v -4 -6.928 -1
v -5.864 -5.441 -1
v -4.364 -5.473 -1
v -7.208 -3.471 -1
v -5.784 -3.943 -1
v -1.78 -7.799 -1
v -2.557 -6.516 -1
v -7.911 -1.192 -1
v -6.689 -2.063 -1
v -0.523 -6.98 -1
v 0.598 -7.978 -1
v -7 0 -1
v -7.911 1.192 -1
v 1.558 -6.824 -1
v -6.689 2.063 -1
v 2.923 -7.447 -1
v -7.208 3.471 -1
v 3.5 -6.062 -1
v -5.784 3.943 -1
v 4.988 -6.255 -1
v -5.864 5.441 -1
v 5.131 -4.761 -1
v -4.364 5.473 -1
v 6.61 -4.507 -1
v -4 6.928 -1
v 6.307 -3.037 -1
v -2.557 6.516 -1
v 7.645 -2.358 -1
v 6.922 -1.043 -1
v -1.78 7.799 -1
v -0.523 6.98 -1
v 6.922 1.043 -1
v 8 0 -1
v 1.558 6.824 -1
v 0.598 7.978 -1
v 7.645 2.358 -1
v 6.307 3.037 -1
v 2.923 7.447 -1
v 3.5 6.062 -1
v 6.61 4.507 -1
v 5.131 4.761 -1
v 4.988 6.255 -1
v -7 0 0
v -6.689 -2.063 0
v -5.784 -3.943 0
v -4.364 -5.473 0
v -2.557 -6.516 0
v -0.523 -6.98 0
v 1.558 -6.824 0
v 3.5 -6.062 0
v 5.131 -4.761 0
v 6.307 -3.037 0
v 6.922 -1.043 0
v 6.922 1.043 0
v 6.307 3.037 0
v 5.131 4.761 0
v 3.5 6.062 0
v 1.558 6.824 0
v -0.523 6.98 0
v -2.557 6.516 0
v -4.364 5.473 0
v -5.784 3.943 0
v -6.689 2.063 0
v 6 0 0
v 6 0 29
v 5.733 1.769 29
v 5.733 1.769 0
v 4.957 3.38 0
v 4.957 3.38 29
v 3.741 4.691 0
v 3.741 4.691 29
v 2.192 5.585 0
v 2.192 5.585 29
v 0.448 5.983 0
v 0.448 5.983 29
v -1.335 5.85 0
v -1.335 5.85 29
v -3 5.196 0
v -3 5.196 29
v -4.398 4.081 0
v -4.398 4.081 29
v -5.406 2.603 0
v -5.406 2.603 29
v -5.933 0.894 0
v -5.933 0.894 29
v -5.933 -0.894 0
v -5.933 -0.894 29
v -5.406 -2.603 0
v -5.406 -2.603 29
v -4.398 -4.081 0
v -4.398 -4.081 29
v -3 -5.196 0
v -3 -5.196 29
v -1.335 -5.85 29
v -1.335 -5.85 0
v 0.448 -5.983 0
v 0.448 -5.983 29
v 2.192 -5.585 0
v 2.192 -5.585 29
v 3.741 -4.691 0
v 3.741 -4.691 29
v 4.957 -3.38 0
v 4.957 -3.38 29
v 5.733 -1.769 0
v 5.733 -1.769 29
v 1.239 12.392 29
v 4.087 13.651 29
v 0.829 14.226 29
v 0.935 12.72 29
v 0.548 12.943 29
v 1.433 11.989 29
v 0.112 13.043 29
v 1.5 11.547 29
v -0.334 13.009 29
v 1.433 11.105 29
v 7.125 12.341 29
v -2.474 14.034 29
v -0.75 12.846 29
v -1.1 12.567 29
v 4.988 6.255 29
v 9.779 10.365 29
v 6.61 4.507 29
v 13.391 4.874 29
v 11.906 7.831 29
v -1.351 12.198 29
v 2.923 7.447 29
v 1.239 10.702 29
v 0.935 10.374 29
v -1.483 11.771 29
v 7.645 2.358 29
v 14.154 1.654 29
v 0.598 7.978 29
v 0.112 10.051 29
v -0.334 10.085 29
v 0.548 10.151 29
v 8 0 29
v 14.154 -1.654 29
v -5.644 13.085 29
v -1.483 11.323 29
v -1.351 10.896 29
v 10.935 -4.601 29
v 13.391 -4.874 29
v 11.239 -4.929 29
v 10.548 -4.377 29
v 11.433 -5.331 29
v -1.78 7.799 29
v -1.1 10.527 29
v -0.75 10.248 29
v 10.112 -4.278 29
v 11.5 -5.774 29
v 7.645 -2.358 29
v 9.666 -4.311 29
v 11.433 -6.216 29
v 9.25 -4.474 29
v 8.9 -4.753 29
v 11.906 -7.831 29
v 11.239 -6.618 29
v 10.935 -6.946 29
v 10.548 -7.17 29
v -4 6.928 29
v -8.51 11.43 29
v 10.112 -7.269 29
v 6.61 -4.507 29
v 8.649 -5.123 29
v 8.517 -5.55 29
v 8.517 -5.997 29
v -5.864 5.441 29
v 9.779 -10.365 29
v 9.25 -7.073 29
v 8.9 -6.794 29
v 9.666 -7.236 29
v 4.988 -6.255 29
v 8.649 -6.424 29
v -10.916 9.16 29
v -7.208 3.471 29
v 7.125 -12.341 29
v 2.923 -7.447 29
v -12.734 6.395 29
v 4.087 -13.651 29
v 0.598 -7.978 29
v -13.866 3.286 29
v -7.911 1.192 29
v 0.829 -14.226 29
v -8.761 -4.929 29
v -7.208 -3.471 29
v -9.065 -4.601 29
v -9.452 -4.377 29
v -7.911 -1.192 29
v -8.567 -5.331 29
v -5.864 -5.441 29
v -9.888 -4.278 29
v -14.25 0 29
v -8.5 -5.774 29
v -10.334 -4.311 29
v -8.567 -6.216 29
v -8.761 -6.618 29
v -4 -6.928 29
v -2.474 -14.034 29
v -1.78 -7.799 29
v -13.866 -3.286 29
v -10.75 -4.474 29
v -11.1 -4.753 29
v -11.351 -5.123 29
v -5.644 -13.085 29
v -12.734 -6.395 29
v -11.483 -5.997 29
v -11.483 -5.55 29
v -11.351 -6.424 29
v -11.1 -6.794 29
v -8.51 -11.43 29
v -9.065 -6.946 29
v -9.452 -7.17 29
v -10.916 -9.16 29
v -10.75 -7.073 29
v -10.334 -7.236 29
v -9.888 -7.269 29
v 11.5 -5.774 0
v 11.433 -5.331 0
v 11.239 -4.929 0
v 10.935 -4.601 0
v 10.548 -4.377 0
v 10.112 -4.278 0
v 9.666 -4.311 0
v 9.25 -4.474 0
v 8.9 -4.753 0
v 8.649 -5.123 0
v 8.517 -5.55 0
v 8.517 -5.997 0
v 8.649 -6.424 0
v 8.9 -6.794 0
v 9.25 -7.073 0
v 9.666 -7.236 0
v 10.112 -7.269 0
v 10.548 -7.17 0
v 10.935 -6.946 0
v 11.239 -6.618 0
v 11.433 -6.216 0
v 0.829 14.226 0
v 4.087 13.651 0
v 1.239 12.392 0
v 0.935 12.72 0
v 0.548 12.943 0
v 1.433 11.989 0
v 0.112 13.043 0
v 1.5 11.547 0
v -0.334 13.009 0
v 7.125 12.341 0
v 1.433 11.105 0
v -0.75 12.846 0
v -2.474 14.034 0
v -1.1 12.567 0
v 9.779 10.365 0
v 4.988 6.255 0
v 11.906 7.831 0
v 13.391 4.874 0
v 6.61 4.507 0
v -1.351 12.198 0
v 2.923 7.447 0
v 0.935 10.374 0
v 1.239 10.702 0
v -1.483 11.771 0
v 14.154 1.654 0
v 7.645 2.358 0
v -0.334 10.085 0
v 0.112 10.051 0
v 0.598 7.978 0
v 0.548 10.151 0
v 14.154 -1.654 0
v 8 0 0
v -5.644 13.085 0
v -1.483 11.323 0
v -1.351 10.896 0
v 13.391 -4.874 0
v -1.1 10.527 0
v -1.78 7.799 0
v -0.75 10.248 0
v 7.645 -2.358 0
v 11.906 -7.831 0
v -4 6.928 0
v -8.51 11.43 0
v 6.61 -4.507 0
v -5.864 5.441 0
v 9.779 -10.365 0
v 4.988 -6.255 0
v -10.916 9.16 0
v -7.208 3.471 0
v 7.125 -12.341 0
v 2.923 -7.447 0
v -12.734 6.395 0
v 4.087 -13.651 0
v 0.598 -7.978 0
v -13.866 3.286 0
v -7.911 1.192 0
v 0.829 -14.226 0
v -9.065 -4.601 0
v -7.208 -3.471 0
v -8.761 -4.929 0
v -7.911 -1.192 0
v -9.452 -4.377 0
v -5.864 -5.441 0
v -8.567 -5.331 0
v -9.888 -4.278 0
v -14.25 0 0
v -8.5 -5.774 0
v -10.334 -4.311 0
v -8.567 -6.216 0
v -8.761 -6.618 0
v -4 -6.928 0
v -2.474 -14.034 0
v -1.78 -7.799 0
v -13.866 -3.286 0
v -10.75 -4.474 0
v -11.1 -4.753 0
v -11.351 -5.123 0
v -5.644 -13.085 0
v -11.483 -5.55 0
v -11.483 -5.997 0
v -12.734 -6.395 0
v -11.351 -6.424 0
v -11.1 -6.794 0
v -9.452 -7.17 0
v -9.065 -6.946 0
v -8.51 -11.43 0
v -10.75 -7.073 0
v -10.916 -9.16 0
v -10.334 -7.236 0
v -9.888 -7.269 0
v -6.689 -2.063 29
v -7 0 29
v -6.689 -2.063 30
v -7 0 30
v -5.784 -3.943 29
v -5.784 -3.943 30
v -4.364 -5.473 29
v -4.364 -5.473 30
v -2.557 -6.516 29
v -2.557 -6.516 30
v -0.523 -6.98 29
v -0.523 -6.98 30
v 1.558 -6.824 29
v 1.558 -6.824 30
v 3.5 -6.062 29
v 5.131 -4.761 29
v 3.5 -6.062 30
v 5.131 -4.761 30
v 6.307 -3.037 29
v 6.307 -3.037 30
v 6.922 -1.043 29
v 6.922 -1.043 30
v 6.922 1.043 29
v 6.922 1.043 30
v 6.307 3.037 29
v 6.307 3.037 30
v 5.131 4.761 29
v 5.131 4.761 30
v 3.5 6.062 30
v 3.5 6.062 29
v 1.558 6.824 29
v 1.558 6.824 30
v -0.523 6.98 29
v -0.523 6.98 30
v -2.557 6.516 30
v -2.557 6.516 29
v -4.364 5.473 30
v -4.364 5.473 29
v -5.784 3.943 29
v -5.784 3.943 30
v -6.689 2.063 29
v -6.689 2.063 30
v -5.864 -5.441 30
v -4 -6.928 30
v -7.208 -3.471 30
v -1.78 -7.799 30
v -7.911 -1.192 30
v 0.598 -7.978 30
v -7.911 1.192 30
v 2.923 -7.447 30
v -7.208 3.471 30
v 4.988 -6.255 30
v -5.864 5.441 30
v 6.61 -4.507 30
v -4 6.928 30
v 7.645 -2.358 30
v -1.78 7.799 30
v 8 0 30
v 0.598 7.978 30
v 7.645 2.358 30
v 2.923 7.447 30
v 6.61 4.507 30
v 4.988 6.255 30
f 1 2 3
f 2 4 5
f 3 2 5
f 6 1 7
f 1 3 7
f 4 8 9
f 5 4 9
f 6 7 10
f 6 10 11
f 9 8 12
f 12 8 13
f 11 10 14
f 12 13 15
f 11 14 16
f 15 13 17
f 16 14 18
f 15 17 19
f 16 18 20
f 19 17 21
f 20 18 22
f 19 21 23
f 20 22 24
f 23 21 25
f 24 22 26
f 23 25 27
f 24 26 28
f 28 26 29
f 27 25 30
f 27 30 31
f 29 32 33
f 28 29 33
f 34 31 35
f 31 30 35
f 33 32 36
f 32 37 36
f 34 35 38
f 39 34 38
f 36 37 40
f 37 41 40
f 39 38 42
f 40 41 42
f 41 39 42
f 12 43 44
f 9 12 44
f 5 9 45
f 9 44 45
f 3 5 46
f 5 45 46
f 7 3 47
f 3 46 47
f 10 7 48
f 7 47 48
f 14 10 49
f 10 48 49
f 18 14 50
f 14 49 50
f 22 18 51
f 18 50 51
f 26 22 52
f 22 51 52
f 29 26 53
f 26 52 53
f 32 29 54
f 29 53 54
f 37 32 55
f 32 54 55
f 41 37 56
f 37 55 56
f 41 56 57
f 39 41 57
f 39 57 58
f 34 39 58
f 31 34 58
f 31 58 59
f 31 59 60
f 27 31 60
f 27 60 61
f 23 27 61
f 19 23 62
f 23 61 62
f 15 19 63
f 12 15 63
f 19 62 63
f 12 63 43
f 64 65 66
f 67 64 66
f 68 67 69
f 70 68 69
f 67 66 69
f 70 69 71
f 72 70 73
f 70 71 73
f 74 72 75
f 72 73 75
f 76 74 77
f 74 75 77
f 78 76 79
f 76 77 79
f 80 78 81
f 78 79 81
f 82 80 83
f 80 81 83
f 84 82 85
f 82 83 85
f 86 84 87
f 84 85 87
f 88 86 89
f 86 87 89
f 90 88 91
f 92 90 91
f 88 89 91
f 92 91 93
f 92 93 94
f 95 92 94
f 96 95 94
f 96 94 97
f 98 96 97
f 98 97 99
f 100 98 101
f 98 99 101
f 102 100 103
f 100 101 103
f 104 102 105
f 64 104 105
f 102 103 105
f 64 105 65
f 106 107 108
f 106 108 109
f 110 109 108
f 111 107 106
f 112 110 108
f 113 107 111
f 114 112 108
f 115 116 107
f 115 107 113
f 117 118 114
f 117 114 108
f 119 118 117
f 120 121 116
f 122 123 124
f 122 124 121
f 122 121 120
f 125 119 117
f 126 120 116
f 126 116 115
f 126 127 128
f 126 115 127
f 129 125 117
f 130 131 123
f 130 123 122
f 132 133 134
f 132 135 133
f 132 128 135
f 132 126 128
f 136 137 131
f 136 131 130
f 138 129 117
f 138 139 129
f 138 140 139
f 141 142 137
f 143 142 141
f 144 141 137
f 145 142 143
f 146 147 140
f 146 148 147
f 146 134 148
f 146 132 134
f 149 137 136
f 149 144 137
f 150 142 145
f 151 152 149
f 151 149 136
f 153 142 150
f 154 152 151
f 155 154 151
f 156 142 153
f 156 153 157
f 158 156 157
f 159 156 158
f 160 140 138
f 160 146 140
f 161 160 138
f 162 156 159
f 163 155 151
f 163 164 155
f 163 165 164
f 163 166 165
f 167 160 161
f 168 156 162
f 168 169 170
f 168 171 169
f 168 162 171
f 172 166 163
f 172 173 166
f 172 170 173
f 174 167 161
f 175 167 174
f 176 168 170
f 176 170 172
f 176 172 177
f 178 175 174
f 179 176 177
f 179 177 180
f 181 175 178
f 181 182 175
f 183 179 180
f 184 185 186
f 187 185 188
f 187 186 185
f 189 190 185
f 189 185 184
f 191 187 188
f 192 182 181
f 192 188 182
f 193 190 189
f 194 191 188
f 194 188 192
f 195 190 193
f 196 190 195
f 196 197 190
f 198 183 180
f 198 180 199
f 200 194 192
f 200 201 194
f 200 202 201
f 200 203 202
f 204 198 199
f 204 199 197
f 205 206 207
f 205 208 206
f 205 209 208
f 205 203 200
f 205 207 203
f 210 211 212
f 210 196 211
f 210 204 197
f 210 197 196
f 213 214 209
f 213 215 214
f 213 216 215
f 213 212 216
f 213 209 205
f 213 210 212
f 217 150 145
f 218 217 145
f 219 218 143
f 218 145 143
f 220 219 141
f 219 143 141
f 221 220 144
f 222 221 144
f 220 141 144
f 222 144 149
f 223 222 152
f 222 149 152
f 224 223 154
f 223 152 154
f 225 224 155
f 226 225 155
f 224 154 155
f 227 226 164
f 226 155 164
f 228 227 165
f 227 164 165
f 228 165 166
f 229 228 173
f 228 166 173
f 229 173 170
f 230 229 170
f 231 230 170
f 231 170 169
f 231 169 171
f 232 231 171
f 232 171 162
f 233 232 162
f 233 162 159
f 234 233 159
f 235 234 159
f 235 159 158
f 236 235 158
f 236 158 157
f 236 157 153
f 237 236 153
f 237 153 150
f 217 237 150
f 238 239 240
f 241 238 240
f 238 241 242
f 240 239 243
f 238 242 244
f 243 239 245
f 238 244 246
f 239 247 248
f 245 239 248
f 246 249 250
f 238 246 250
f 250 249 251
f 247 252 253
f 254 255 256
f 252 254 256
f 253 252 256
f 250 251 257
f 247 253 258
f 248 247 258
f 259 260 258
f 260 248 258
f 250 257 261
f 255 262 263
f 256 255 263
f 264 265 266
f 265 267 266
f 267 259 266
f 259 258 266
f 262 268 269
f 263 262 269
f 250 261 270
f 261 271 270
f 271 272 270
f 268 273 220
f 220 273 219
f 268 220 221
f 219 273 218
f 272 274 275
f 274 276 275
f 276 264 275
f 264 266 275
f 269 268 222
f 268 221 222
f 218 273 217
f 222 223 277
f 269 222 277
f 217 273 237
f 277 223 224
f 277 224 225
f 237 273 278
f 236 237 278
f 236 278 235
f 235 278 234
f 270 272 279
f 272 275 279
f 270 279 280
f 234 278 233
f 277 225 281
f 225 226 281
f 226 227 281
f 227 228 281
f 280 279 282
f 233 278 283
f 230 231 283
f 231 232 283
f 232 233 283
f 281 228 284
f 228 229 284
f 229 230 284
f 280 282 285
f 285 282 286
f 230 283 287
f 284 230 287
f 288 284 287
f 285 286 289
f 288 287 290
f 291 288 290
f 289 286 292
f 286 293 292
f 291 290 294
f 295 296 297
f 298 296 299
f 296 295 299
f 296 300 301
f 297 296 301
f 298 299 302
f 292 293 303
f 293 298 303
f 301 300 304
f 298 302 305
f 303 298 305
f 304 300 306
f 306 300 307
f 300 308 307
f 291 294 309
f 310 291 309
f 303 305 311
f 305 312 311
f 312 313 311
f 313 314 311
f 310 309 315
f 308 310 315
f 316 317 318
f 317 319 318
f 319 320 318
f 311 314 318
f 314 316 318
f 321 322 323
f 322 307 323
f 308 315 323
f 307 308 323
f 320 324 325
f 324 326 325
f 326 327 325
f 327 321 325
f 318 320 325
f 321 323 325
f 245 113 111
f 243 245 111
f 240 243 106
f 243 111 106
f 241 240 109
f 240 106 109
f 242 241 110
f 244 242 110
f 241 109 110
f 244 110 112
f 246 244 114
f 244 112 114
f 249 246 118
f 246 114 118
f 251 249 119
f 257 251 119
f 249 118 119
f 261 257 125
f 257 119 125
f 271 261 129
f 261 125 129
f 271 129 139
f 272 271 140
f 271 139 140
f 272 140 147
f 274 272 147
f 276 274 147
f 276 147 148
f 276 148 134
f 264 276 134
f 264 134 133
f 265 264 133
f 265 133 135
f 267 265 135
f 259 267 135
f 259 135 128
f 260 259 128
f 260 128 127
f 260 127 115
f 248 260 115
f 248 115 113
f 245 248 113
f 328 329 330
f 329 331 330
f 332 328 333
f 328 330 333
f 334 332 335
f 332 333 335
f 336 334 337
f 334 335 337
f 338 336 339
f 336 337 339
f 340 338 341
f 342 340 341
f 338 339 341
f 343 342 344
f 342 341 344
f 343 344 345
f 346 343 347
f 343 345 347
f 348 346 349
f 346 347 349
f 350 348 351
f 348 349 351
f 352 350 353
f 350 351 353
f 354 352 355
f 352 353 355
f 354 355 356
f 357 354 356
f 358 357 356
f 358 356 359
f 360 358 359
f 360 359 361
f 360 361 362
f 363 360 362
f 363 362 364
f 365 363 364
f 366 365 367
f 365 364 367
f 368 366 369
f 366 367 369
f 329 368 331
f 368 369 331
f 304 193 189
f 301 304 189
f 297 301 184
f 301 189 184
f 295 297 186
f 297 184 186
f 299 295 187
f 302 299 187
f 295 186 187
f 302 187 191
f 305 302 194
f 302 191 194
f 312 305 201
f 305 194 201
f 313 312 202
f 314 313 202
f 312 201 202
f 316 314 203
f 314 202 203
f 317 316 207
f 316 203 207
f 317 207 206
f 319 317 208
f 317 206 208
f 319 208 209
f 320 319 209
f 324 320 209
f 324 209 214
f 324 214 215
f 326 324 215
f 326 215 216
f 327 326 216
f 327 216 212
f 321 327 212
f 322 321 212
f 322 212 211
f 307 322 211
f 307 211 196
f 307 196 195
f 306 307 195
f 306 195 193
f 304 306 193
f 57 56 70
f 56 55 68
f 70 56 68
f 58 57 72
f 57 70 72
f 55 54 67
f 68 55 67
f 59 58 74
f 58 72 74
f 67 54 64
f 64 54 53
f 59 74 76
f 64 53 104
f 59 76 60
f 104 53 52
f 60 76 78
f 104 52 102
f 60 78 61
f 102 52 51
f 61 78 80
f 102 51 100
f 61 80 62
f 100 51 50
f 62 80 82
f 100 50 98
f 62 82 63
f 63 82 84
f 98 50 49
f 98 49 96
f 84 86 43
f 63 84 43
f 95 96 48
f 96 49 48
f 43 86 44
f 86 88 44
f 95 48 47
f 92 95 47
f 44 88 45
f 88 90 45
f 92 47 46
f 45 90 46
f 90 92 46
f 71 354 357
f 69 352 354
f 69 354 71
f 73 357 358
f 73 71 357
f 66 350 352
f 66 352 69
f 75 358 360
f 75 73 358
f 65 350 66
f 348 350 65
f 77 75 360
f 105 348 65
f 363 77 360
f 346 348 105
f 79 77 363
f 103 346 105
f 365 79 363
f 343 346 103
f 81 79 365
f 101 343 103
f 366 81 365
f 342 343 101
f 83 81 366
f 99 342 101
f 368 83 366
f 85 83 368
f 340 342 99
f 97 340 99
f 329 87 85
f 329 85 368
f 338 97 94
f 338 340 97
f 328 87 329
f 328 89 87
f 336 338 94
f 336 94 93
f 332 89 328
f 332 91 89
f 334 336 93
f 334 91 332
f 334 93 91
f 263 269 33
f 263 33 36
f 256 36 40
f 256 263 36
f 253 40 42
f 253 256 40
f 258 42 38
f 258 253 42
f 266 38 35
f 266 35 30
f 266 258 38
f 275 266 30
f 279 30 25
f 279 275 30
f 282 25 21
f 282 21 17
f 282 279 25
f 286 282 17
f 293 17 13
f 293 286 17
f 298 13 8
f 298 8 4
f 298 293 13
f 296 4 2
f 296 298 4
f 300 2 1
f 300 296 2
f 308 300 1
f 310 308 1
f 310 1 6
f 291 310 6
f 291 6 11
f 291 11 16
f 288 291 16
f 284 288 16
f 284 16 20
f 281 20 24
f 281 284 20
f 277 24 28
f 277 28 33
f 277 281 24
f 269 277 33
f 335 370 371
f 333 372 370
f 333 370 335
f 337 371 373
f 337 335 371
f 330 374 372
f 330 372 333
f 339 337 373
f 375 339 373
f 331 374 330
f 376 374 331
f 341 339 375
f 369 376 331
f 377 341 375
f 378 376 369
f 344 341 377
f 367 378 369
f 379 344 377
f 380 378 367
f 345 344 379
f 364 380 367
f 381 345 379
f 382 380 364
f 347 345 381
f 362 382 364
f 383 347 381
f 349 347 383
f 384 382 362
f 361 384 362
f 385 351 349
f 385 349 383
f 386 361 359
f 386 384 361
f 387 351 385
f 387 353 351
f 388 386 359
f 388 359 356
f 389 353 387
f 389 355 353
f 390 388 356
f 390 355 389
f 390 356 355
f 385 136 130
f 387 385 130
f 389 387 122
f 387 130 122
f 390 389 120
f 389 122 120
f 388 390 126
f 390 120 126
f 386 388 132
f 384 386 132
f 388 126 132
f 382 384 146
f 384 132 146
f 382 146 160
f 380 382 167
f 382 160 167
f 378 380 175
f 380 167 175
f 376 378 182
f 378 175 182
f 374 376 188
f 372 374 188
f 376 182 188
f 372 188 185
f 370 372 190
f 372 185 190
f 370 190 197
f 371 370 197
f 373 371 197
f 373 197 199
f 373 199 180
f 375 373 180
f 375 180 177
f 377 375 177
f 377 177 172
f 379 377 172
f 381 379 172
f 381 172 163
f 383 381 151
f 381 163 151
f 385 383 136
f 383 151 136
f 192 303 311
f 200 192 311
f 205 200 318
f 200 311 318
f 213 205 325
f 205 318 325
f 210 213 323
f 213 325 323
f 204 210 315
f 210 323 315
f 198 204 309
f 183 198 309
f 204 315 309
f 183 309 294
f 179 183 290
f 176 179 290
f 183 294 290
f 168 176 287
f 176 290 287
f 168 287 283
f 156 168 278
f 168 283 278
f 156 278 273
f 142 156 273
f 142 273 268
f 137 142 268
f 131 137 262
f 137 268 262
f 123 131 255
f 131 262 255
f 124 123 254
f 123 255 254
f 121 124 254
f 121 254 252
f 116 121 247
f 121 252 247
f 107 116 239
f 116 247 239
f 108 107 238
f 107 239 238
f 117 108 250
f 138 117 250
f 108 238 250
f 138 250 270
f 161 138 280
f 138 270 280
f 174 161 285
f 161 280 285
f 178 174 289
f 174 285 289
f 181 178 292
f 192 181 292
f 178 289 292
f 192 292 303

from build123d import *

# Parameters (mm, degrees)
SKETCH1_R           = 14.25
SKETCH1_R_2         = 7
BOSS_EXTRUDE1_DEPTH = 29
SKETCH2_R           = 8
SKETCH2_R_2         = 7
BOSS_EXTRUDE2_DEPTH = 1
SKETCH3_R           = 1.5
CUT_EXTRUDE1_DEPTH  = 37.140351409
SKETCH4_R           = 7
SKETCH4_R_2         = 6
BOSS_EXTRUDE3_DEPTH = 29


with BuildPart() as part:
    # Sketch1 → Boss-Extrude1 (new body)
    with BuildSketch(Plane.XY):
        with Locations(Location((0, 0, 0), (0, 0, 180))):
            Circle(SKETCH1_R)
        with Locations(Location((0, 0, 0), (0, 0, 180))):
            Circle(SKETCH1_R_2, mode=Mode.SUBTRACT)
    extrude(amount=BOSS_EXTRUDE1_DEPTH)

    # Sketch2 → Boss-Extrude2 (add)
    with BuildSketch(Plane.XY.offset(29)):
        Circle(SKETCH2_R)
        with Locations(Location((0, 0, 0), (0, 0, 180))):
            Circle(SKETCH2_R_2, mode=Mode.SUBTRACT)
    boss_extrude2 = extrude(amount=BOSS_EXTRUDE2_DEPTH)

    # Mirror1: Boss-Extrude2 across plane
    add(boss_extrude2.mirror(Plane.XY.offset(14.5)))

    # Sketch3 → Cut-Extrude1 (cut, through all)
    with BuildSketch(Plane.XY.offset(29)):
        with Locations((0, 11.547005384)):
            Circle(SKETCH3_R)
        with Locations((10, -5.773502692)):
            Circle(SKETCH3_R)
        with Locations((-10, -5.773502692)):
            Circle(SKETCH3_R)
    extrude(amount=-CUT_EXTRUDE1_DEPTH, mode=Mode.SUBTRACT)

    # Sketch4 → Boss-Extrude3 (add)
    with BuildSketch(Plane.XY.offset(29)):
        with Locations(Location((0, 0, 0), (0, 0, 180))):
            Circle(SKETCH4_R)
        Circle(SKETCH4_R_2, mode=Mode.SUBTRACT)
    extrude(amount=-BOSS_EXTRUDE3_DEPTH)


solid = part.part
